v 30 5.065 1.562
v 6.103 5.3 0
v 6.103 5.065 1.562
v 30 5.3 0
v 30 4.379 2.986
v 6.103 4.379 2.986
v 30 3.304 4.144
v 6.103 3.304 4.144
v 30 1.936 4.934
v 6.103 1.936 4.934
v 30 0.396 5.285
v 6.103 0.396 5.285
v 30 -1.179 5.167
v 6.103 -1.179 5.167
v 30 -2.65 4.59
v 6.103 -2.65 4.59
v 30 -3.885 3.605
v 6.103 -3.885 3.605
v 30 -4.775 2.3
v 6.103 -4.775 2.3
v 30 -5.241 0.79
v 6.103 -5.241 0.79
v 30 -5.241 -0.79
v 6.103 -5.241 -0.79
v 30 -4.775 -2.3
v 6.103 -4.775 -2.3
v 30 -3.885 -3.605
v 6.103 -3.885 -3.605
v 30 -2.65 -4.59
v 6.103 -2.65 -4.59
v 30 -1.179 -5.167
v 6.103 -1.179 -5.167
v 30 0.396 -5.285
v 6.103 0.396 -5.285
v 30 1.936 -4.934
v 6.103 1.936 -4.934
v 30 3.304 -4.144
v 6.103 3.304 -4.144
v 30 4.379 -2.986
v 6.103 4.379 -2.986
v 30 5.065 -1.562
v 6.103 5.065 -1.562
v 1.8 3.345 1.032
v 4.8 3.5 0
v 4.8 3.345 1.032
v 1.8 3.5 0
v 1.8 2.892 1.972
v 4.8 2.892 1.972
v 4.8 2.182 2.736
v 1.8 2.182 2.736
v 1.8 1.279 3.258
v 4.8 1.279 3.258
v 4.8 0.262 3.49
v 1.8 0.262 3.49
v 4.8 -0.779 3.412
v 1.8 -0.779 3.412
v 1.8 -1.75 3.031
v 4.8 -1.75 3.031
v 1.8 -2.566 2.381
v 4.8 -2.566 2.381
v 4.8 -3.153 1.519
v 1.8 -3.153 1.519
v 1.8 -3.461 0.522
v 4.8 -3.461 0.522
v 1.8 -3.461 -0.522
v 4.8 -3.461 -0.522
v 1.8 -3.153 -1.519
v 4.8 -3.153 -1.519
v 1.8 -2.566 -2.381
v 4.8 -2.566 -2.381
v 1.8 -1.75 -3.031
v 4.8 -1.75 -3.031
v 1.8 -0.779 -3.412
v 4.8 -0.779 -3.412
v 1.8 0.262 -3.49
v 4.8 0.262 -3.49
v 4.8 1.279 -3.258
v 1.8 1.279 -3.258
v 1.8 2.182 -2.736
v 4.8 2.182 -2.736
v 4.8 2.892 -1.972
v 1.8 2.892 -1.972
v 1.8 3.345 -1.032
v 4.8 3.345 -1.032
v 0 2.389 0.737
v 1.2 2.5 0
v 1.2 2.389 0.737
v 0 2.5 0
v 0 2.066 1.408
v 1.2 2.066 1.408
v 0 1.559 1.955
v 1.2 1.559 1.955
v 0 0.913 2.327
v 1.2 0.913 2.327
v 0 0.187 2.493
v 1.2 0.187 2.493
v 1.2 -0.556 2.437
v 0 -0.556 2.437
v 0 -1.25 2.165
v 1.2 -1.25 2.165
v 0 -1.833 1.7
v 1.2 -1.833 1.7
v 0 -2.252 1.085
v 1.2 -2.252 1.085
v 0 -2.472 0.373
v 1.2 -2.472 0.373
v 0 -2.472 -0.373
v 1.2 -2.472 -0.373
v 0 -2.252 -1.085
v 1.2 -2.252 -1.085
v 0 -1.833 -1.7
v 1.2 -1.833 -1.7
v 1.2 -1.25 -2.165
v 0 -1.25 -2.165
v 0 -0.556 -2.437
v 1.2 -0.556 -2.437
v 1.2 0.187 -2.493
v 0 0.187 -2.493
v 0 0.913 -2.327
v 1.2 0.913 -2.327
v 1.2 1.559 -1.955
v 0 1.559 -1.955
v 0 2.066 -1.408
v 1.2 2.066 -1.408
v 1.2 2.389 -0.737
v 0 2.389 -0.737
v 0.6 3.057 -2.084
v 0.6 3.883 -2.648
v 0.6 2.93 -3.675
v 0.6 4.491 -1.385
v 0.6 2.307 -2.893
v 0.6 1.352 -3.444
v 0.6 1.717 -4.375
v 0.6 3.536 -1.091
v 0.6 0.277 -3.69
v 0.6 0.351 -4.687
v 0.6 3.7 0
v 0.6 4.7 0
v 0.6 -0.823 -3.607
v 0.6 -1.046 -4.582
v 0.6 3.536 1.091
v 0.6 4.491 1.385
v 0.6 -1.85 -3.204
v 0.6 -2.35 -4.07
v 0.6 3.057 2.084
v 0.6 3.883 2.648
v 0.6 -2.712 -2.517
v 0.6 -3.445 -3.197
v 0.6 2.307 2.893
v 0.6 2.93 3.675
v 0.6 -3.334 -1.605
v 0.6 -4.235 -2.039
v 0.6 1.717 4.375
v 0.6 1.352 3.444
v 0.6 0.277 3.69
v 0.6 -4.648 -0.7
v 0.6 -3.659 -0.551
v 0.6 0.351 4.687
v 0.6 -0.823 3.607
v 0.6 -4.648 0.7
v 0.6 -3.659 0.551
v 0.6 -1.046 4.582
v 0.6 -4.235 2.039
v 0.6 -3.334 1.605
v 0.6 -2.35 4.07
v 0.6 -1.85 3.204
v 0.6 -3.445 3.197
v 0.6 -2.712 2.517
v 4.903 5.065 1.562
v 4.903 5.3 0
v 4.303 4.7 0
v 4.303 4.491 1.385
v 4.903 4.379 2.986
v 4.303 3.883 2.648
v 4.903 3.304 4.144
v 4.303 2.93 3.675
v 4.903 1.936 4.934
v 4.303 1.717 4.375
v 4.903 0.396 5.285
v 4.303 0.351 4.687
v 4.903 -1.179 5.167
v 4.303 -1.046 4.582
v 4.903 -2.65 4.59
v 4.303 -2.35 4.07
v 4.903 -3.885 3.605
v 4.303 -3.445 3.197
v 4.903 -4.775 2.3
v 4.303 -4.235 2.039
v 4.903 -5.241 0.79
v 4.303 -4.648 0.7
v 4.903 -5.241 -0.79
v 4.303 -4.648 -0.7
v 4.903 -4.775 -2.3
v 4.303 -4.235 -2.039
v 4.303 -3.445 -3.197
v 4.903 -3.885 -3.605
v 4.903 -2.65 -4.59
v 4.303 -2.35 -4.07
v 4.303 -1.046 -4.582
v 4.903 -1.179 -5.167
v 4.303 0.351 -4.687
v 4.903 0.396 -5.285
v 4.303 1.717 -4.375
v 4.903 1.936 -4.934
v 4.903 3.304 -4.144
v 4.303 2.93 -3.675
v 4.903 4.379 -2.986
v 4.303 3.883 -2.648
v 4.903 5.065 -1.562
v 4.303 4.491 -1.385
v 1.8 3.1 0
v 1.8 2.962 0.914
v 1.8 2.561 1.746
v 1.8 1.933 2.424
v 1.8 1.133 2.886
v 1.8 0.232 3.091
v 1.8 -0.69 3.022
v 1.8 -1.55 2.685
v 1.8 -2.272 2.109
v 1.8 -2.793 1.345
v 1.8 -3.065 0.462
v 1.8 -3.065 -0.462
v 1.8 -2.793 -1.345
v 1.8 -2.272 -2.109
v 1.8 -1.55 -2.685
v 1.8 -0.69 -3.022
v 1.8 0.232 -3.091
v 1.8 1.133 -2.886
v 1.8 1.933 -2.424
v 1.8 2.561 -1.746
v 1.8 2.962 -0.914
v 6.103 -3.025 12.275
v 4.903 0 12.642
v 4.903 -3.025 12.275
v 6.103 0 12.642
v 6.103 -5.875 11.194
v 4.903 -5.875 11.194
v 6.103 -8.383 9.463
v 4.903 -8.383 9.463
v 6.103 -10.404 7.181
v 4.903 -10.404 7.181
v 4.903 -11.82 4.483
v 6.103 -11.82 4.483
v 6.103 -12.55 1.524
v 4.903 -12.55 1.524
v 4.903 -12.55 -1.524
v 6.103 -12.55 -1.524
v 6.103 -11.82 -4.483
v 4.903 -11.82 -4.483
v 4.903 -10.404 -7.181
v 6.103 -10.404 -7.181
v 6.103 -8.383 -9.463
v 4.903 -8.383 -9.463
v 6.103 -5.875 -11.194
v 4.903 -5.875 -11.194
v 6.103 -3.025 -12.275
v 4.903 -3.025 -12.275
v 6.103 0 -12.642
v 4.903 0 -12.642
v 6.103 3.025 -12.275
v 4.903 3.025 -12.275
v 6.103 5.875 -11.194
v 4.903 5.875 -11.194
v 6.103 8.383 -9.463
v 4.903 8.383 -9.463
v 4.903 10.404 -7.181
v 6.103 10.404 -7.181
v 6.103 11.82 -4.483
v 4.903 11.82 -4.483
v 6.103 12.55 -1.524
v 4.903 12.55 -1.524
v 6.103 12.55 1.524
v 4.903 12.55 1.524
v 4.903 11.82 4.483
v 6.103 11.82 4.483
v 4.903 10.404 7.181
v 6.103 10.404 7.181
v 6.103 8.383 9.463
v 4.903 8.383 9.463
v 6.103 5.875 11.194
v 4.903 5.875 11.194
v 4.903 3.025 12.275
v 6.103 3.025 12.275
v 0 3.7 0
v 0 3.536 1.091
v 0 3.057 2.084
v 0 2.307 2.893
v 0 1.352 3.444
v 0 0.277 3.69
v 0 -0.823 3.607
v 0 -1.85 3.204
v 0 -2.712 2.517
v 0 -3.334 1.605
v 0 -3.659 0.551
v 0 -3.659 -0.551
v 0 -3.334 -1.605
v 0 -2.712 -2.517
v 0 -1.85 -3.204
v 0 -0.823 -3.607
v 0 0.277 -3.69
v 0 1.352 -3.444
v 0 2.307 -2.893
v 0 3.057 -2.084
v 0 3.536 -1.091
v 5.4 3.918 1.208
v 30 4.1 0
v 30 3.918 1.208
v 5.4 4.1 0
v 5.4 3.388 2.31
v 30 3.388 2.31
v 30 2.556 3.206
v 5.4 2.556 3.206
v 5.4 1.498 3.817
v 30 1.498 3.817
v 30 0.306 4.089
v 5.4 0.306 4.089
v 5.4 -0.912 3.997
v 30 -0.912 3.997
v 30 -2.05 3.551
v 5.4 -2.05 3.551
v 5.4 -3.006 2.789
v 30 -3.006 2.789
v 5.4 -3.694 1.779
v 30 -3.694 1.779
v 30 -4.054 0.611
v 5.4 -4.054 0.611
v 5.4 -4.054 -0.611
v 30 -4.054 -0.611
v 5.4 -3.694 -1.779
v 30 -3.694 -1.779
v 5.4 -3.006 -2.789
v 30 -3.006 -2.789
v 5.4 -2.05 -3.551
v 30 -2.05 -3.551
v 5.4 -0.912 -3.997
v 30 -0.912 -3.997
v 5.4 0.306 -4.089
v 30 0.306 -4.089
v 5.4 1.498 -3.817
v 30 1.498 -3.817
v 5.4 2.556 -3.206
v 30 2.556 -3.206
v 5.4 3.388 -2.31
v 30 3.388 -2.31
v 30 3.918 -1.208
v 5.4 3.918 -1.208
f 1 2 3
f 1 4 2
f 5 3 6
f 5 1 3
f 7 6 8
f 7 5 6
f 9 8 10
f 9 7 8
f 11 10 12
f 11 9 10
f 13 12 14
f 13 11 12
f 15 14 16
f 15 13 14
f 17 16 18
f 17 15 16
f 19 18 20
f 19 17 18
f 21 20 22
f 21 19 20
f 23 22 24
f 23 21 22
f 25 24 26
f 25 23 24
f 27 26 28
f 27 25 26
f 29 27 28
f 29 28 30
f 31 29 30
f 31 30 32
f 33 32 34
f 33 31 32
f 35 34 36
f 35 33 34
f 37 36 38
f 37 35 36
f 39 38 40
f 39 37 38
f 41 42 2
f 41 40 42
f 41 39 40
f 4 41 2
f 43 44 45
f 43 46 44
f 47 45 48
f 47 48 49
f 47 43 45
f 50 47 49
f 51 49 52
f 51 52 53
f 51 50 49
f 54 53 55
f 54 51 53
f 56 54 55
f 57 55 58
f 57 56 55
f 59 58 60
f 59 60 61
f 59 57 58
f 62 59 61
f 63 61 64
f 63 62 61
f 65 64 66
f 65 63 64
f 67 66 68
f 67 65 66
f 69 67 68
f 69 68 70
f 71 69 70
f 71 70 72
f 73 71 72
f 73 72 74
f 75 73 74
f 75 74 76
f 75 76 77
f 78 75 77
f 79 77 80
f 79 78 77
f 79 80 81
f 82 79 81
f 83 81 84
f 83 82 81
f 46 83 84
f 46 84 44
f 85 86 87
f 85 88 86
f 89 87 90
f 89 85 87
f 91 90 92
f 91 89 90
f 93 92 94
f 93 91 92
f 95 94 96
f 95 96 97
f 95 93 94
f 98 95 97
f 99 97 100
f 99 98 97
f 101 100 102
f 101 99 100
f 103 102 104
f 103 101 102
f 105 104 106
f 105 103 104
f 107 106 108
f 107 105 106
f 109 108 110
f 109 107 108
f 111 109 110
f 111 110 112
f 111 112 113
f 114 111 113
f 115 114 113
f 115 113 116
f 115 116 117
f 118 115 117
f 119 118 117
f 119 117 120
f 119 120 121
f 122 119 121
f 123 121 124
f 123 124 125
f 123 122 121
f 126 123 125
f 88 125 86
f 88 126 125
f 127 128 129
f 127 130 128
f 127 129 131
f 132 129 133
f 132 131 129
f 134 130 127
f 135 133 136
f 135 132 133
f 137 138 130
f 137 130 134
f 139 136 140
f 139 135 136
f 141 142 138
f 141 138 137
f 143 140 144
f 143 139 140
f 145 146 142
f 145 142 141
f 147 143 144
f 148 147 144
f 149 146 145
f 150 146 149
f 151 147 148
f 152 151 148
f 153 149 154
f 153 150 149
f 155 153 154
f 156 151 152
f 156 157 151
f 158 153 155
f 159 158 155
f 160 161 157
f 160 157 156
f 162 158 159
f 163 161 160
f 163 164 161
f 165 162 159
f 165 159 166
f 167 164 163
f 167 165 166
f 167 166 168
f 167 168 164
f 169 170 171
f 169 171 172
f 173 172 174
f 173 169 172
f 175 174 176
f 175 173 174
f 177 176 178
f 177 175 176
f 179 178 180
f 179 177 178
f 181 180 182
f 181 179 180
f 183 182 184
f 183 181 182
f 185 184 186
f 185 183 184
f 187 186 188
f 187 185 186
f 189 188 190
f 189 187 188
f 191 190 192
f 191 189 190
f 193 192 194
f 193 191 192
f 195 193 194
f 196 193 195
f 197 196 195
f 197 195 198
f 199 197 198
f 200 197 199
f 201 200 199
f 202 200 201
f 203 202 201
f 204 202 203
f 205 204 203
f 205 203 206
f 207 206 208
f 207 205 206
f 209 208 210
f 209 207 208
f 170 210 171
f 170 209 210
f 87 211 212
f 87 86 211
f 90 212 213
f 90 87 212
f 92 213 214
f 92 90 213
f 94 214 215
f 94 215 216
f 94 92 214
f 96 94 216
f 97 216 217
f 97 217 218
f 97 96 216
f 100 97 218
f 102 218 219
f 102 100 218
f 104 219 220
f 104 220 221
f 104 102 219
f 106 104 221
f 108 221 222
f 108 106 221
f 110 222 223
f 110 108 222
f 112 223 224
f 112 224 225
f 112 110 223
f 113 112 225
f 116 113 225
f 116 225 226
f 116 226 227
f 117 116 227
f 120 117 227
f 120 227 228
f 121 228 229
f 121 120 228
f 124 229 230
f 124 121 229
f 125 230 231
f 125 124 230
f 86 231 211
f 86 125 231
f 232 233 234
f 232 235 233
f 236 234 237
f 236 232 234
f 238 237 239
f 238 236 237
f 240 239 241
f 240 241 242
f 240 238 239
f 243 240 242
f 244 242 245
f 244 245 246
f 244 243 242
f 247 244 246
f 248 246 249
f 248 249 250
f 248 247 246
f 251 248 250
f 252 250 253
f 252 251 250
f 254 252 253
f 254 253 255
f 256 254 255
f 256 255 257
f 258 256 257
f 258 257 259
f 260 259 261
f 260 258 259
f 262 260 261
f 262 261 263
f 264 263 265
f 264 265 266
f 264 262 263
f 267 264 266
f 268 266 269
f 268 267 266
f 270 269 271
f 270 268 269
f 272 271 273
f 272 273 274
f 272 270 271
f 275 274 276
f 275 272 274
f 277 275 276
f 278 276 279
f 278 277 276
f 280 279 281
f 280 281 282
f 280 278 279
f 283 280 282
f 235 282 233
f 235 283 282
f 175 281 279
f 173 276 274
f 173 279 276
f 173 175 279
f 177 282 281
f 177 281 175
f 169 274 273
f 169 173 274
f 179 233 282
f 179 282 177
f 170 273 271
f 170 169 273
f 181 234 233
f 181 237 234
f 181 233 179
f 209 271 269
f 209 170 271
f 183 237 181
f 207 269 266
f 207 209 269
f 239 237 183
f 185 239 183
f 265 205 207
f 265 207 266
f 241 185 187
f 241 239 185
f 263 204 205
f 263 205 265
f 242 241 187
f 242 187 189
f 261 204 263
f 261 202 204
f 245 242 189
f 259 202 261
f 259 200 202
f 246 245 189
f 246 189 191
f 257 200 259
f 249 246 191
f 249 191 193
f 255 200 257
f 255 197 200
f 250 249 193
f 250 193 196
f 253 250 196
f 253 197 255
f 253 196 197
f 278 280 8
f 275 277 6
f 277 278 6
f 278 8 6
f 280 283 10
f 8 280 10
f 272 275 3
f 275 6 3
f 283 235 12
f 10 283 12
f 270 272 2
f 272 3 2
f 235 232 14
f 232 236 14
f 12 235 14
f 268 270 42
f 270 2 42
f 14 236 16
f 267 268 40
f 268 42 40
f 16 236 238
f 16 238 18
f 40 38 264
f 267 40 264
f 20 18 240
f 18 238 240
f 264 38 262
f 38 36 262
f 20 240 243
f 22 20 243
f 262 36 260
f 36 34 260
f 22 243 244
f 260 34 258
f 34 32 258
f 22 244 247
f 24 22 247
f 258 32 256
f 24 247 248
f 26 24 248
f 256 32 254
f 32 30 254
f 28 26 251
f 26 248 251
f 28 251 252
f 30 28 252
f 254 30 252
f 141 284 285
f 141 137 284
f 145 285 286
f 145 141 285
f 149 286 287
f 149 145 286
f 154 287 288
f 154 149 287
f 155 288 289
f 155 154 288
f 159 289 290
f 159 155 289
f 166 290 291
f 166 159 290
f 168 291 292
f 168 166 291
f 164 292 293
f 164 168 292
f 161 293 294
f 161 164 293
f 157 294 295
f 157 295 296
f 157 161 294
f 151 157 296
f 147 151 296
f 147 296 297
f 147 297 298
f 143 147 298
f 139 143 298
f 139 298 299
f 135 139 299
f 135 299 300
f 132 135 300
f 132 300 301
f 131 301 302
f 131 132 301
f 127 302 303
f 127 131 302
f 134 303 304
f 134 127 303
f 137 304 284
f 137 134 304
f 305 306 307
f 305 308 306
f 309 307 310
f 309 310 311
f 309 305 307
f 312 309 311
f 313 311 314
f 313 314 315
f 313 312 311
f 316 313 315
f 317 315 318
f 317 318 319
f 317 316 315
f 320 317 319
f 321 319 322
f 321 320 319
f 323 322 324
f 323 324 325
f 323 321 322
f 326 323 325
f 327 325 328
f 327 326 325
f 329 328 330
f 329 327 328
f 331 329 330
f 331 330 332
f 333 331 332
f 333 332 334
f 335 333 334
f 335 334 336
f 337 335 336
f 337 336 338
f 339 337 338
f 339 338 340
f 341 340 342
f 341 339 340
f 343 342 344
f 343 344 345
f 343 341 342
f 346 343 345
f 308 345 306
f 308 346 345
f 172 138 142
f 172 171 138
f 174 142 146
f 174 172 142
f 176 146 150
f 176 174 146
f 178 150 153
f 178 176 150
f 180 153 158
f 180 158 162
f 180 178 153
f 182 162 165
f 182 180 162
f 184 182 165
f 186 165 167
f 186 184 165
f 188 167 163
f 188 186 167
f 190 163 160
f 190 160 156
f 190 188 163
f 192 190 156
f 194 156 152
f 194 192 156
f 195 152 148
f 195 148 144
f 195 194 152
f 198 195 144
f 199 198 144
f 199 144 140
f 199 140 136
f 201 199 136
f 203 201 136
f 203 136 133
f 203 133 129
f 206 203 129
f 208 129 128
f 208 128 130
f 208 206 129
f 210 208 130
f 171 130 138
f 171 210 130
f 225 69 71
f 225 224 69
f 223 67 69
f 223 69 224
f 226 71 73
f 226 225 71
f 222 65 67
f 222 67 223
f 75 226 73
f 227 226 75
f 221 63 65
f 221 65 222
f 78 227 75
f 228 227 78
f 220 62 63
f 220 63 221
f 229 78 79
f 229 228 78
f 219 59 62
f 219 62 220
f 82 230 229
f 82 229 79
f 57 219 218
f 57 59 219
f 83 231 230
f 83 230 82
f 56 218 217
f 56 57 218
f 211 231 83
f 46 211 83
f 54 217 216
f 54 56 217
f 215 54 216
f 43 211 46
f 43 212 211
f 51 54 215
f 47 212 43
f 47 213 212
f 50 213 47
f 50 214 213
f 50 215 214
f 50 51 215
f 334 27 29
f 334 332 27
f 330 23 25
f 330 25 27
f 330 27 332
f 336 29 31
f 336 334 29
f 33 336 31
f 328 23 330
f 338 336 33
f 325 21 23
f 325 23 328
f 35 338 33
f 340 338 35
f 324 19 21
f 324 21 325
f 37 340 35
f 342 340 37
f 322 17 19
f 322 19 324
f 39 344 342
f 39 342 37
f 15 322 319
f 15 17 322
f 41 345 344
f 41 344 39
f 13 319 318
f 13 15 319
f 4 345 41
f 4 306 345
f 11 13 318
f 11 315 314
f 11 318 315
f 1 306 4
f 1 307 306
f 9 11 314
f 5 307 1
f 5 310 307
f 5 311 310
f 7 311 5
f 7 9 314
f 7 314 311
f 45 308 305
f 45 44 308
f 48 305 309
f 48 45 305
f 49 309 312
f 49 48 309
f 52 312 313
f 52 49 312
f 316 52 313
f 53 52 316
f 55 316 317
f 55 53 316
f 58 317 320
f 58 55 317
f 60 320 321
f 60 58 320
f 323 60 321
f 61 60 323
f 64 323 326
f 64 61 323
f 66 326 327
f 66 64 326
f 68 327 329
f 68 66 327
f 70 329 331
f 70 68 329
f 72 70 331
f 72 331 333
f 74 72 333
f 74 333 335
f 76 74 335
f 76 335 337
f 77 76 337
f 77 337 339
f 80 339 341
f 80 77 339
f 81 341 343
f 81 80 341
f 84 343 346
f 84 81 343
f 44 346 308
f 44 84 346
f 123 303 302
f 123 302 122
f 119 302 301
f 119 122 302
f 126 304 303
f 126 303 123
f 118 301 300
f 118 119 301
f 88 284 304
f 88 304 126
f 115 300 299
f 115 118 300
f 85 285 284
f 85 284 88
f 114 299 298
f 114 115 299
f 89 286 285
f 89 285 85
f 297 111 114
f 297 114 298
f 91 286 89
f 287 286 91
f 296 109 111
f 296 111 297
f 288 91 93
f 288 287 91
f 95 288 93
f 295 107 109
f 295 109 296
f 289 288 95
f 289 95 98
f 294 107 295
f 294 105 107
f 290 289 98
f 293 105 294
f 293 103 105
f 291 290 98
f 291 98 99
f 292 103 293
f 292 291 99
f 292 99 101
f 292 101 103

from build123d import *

# Parameters (mm, degrees)
SKETCH2_W = 1.2
SKETCH2_H = 7.341985405


# Read off the part's stored shape, not the designer's step: Revolve-Thin1
with BuildPart() as part:
    # Revolve-Thin1 outline → Revolve-Thin1 (revolve)
    with BuildSketch(Plane.YX):
        Polygon((4.1, 5.4), (3.5, 4.8), (3.5, 1.8), (3.1, 1.8), (2.5, 1.2), (2.5, 0), (3.7, 0), (3.7, 0.6), (4.7, 0.6), (4.7, 4.302943725), (5.3, 4.902943725), (5.3, 30), (4.1, 30), align=None)
    revolve(axis=Axis((0, 0, 0), (1, 0, 0)))

    # Sketch2 → Revolve-Thin2 (revolve)
    with BuildSketch(Plane.XY, mode=Mode.PRIVATE) as revolve_thin2_sk:
        with Locations((5.502943725, 8.970992703)):
            Rectangle(SKETCH2_W, SKETCH2_H)
    revolve(revolve_thin2_sk.sketch.rotate(Axis((0, 0, 0), (1, 0, 0)), 90), axis=Axis((0, 0, 0), (1, 0, 0)))


solid = part.part
